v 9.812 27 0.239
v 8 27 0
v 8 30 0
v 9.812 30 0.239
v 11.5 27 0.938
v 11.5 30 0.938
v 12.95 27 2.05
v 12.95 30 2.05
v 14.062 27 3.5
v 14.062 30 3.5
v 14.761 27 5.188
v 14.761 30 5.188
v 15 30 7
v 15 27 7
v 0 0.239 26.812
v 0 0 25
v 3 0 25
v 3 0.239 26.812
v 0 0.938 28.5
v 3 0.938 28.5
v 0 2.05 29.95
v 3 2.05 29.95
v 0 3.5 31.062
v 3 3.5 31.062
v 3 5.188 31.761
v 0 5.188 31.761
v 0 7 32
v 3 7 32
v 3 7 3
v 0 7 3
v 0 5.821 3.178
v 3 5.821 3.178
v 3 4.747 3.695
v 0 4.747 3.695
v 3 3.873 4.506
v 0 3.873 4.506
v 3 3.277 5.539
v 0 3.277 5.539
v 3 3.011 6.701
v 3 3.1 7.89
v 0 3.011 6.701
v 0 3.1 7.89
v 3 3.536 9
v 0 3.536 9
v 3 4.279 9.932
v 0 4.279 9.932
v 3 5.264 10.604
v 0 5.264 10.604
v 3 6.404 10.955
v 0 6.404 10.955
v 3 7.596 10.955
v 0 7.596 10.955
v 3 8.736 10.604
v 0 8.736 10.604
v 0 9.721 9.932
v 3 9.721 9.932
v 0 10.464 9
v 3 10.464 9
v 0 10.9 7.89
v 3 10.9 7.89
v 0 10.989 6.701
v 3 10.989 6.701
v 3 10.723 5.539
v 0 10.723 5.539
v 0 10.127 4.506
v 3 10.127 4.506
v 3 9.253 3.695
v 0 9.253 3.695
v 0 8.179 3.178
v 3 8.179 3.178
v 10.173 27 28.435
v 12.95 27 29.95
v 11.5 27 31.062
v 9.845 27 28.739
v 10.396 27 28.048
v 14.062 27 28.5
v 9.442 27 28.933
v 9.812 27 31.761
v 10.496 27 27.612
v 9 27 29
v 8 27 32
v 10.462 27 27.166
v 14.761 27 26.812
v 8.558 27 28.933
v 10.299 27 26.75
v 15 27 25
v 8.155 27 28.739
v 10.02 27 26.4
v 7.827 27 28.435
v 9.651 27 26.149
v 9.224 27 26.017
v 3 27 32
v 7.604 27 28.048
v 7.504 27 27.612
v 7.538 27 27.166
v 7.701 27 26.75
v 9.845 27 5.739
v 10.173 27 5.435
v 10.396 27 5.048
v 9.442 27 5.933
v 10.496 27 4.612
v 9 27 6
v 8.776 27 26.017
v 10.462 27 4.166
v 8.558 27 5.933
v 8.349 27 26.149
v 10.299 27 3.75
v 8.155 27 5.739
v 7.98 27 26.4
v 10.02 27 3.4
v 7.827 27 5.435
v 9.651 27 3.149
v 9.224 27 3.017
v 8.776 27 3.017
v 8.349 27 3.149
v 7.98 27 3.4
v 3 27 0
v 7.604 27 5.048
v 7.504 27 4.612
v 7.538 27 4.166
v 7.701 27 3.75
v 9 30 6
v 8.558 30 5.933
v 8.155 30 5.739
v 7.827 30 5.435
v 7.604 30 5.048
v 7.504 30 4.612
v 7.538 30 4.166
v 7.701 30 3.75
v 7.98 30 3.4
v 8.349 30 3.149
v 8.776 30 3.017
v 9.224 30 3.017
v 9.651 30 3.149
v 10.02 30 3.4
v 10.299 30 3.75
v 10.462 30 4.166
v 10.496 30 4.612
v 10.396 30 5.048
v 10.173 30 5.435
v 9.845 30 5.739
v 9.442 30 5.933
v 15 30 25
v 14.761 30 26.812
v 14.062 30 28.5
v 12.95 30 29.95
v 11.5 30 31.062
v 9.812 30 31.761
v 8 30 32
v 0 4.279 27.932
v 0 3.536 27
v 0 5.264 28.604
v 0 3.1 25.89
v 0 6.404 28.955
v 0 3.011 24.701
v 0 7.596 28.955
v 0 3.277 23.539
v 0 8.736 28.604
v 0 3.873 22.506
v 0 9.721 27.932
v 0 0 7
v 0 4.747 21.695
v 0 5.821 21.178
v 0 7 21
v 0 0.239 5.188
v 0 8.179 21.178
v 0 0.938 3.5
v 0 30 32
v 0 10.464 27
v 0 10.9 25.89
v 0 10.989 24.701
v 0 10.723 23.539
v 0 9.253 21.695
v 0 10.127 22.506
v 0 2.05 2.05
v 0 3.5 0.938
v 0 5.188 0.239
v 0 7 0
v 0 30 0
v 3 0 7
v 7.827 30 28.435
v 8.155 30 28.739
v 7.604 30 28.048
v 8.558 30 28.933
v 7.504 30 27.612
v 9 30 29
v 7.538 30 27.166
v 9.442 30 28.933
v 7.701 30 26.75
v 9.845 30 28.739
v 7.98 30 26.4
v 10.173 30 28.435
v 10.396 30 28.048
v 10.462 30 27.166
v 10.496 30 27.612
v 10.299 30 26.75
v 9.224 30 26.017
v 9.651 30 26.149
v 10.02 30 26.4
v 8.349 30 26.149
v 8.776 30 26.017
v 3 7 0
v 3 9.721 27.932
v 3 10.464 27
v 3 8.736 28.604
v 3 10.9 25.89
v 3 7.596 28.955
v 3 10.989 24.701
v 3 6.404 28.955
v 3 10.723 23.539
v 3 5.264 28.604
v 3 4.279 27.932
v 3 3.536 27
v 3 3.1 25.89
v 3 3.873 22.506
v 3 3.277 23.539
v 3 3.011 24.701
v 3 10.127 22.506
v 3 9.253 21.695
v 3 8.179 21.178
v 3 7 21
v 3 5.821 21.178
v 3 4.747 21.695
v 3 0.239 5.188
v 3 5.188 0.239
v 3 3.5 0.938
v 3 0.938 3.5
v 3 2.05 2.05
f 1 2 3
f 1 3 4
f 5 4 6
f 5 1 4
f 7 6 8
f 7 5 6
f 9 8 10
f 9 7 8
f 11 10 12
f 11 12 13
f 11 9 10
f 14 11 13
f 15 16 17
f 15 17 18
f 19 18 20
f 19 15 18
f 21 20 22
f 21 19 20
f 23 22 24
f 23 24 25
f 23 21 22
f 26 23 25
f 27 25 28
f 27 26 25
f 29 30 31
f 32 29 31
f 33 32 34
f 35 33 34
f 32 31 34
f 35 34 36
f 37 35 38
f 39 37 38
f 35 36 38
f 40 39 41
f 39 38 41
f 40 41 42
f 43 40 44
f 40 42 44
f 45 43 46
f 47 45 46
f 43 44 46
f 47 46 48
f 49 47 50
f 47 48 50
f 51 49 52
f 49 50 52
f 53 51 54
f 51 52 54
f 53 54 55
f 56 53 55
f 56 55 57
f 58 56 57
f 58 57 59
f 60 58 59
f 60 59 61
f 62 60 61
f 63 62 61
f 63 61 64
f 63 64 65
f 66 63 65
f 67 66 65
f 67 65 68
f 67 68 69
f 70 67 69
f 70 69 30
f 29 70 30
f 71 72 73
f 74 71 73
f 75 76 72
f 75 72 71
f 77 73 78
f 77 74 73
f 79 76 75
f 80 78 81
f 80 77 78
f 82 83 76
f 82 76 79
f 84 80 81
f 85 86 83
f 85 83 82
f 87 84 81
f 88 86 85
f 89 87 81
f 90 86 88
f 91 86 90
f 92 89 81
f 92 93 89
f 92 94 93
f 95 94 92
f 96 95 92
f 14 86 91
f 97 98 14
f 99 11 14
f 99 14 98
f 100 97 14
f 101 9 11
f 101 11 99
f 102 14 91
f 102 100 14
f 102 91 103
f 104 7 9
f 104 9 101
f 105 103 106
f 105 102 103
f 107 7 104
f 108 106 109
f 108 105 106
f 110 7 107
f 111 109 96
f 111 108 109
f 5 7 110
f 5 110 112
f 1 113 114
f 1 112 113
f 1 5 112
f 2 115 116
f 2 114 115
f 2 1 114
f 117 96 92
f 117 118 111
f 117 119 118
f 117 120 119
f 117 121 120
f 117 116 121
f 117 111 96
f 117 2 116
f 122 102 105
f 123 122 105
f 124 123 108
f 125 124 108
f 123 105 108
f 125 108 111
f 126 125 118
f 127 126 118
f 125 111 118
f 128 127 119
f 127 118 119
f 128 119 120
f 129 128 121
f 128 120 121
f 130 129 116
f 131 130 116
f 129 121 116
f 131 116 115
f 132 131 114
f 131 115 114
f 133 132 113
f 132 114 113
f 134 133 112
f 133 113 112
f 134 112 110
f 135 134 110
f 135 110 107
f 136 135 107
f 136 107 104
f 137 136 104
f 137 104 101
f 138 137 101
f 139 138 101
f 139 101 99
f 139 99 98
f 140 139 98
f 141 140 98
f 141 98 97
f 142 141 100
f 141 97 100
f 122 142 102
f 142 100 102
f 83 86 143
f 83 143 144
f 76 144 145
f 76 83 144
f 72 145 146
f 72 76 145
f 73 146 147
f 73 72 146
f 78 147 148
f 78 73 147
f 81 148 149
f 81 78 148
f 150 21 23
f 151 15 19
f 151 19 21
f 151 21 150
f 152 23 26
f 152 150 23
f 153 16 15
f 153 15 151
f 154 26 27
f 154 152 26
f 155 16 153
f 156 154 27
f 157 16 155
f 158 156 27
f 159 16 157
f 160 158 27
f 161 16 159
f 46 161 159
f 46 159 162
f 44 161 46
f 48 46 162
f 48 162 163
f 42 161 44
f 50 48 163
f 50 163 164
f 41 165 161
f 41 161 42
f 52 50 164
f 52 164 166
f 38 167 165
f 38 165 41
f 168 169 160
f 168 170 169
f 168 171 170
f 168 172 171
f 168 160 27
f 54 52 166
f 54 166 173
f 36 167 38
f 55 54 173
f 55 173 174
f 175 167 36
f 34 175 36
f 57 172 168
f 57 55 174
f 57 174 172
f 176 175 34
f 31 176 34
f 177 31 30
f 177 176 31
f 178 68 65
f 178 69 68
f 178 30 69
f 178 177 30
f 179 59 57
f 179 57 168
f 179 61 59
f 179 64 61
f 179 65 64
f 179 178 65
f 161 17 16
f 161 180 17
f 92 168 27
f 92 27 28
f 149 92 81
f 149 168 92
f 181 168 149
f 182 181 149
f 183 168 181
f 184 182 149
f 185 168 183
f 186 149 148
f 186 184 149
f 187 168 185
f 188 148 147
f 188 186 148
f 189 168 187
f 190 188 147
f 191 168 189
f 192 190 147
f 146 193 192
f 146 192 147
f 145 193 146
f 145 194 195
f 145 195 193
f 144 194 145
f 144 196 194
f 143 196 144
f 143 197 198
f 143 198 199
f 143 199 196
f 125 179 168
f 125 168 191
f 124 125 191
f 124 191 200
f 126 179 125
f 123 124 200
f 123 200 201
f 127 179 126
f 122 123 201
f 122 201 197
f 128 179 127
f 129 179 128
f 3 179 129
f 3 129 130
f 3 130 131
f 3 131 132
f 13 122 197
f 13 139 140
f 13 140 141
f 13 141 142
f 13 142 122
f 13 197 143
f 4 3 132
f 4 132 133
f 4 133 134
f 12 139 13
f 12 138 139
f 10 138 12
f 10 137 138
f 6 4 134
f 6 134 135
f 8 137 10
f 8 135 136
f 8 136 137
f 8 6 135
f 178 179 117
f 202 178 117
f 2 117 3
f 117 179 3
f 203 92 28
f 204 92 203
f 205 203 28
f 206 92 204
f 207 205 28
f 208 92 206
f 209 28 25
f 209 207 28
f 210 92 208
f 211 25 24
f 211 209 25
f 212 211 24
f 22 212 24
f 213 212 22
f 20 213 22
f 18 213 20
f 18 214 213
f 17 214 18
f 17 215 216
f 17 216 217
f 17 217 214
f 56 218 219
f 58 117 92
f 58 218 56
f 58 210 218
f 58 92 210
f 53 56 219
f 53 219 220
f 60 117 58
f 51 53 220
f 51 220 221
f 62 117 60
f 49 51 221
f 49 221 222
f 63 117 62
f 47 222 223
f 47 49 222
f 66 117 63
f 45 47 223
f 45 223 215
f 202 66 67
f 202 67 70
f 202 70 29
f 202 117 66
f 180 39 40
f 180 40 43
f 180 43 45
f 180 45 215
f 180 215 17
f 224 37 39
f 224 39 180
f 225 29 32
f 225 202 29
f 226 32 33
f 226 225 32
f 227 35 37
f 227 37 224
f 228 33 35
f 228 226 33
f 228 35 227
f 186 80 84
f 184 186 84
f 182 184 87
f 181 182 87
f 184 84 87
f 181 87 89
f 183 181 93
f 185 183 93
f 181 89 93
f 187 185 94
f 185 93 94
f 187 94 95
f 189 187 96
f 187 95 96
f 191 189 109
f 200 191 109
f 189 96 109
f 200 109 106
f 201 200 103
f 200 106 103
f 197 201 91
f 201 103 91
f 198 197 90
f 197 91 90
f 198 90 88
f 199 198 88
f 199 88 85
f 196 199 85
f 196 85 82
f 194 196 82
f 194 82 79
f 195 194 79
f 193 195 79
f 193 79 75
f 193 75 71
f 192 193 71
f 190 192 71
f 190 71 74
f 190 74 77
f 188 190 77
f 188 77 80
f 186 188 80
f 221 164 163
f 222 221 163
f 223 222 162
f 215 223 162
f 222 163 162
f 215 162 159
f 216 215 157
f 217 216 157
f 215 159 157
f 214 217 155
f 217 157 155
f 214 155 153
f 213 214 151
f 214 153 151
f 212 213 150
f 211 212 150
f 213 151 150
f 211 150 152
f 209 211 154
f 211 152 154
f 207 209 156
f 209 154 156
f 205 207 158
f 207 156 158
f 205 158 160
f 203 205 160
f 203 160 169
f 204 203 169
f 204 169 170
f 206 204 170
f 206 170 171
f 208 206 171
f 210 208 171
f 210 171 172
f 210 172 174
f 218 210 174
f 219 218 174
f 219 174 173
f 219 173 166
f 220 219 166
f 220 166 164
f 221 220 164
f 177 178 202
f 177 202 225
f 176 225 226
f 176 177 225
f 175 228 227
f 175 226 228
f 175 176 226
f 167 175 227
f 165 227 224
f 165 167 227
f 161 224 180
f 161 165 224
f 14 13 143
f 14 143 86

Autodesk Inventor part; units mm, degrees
ref_plane "YZ Plane" through (0, 0, 0) normal (1, 0, 0) x (0, 1, 0)
ref_plane "XZ Plane" through (0, 0, 0) normal (0, 1, 0) x (-1, 0, 0)
ref_plane "XY Plane" through (0, 0, 0) normal (0, 0, 1) x (1, 0, 0)
sketch "Sketch1" plane through (0, 0, 0) normal (0, 0, 1) x (1, 0, 0)
  line L0 (0, 0) -> (0, 30)
  line L1 (0, 30) -> (15, 30)
  line L2 (15, 30) -> (15, 27)
  line L3 (15, 27) -> (3, 27)
  line L4 (3, 27) -> (3, 0)
  line L5 (3, 0) -> (0, 0)
  dimension "d0" = 30
  dimension "d1" = 12
  dimension "d2" = 3
  dimension "d3" = 3
extrude "Extrusion1" add sketch "Sketch1" along normal blind 32
fillet "Fillet1" radius 7 2 edges at (1.5, 0, 32) (1.5, 0, 0)
sketch "Sketch2" plane through (3, 27, 32) normal (1, 0, 0) x (0, 0, -1)
  line L0 (0, -20) -> (0, 0) projected
  line L1 (32, 3) -> (0, 3) projected
  point P0 (32, -27)
  point P1 (7, -20)
  point P2 (25, -20)
  dimension "d7" = 18
  dimension "d8" = 7
  dimension "d9" = 23
  dimension "d10" = 23
hole "Hole1" at (3, 7, 25) at (3, 7, 7) direction (-1, 0, 0) diameter 8 end through all
sketch "Sketch3" plane through (0, 30, 0) normal (0, 1, 0) x (1, 0, 0)
  line L0 (15, 0) -> (0, 0) projected
  line L1 (0, 0) -> (0, -32) projected
  point P0 (9, -27.5)
  point P1 (9, -4.5)
  dimension "d18" = 23
  dimension "d19" = 4.5
  dimension "d20" = 9
  dimension "d21" = 9
hole "Hole2" at (9, 30, 27.5) at (9, 30, 4.5) direction (0, -1, 0) diameter 3 end through all
fillet "Fillet2" radius 7 2 edges at (15, 28.5, 0) (15, 28.5, 32)
properties part number "HUDSON-1-76"
